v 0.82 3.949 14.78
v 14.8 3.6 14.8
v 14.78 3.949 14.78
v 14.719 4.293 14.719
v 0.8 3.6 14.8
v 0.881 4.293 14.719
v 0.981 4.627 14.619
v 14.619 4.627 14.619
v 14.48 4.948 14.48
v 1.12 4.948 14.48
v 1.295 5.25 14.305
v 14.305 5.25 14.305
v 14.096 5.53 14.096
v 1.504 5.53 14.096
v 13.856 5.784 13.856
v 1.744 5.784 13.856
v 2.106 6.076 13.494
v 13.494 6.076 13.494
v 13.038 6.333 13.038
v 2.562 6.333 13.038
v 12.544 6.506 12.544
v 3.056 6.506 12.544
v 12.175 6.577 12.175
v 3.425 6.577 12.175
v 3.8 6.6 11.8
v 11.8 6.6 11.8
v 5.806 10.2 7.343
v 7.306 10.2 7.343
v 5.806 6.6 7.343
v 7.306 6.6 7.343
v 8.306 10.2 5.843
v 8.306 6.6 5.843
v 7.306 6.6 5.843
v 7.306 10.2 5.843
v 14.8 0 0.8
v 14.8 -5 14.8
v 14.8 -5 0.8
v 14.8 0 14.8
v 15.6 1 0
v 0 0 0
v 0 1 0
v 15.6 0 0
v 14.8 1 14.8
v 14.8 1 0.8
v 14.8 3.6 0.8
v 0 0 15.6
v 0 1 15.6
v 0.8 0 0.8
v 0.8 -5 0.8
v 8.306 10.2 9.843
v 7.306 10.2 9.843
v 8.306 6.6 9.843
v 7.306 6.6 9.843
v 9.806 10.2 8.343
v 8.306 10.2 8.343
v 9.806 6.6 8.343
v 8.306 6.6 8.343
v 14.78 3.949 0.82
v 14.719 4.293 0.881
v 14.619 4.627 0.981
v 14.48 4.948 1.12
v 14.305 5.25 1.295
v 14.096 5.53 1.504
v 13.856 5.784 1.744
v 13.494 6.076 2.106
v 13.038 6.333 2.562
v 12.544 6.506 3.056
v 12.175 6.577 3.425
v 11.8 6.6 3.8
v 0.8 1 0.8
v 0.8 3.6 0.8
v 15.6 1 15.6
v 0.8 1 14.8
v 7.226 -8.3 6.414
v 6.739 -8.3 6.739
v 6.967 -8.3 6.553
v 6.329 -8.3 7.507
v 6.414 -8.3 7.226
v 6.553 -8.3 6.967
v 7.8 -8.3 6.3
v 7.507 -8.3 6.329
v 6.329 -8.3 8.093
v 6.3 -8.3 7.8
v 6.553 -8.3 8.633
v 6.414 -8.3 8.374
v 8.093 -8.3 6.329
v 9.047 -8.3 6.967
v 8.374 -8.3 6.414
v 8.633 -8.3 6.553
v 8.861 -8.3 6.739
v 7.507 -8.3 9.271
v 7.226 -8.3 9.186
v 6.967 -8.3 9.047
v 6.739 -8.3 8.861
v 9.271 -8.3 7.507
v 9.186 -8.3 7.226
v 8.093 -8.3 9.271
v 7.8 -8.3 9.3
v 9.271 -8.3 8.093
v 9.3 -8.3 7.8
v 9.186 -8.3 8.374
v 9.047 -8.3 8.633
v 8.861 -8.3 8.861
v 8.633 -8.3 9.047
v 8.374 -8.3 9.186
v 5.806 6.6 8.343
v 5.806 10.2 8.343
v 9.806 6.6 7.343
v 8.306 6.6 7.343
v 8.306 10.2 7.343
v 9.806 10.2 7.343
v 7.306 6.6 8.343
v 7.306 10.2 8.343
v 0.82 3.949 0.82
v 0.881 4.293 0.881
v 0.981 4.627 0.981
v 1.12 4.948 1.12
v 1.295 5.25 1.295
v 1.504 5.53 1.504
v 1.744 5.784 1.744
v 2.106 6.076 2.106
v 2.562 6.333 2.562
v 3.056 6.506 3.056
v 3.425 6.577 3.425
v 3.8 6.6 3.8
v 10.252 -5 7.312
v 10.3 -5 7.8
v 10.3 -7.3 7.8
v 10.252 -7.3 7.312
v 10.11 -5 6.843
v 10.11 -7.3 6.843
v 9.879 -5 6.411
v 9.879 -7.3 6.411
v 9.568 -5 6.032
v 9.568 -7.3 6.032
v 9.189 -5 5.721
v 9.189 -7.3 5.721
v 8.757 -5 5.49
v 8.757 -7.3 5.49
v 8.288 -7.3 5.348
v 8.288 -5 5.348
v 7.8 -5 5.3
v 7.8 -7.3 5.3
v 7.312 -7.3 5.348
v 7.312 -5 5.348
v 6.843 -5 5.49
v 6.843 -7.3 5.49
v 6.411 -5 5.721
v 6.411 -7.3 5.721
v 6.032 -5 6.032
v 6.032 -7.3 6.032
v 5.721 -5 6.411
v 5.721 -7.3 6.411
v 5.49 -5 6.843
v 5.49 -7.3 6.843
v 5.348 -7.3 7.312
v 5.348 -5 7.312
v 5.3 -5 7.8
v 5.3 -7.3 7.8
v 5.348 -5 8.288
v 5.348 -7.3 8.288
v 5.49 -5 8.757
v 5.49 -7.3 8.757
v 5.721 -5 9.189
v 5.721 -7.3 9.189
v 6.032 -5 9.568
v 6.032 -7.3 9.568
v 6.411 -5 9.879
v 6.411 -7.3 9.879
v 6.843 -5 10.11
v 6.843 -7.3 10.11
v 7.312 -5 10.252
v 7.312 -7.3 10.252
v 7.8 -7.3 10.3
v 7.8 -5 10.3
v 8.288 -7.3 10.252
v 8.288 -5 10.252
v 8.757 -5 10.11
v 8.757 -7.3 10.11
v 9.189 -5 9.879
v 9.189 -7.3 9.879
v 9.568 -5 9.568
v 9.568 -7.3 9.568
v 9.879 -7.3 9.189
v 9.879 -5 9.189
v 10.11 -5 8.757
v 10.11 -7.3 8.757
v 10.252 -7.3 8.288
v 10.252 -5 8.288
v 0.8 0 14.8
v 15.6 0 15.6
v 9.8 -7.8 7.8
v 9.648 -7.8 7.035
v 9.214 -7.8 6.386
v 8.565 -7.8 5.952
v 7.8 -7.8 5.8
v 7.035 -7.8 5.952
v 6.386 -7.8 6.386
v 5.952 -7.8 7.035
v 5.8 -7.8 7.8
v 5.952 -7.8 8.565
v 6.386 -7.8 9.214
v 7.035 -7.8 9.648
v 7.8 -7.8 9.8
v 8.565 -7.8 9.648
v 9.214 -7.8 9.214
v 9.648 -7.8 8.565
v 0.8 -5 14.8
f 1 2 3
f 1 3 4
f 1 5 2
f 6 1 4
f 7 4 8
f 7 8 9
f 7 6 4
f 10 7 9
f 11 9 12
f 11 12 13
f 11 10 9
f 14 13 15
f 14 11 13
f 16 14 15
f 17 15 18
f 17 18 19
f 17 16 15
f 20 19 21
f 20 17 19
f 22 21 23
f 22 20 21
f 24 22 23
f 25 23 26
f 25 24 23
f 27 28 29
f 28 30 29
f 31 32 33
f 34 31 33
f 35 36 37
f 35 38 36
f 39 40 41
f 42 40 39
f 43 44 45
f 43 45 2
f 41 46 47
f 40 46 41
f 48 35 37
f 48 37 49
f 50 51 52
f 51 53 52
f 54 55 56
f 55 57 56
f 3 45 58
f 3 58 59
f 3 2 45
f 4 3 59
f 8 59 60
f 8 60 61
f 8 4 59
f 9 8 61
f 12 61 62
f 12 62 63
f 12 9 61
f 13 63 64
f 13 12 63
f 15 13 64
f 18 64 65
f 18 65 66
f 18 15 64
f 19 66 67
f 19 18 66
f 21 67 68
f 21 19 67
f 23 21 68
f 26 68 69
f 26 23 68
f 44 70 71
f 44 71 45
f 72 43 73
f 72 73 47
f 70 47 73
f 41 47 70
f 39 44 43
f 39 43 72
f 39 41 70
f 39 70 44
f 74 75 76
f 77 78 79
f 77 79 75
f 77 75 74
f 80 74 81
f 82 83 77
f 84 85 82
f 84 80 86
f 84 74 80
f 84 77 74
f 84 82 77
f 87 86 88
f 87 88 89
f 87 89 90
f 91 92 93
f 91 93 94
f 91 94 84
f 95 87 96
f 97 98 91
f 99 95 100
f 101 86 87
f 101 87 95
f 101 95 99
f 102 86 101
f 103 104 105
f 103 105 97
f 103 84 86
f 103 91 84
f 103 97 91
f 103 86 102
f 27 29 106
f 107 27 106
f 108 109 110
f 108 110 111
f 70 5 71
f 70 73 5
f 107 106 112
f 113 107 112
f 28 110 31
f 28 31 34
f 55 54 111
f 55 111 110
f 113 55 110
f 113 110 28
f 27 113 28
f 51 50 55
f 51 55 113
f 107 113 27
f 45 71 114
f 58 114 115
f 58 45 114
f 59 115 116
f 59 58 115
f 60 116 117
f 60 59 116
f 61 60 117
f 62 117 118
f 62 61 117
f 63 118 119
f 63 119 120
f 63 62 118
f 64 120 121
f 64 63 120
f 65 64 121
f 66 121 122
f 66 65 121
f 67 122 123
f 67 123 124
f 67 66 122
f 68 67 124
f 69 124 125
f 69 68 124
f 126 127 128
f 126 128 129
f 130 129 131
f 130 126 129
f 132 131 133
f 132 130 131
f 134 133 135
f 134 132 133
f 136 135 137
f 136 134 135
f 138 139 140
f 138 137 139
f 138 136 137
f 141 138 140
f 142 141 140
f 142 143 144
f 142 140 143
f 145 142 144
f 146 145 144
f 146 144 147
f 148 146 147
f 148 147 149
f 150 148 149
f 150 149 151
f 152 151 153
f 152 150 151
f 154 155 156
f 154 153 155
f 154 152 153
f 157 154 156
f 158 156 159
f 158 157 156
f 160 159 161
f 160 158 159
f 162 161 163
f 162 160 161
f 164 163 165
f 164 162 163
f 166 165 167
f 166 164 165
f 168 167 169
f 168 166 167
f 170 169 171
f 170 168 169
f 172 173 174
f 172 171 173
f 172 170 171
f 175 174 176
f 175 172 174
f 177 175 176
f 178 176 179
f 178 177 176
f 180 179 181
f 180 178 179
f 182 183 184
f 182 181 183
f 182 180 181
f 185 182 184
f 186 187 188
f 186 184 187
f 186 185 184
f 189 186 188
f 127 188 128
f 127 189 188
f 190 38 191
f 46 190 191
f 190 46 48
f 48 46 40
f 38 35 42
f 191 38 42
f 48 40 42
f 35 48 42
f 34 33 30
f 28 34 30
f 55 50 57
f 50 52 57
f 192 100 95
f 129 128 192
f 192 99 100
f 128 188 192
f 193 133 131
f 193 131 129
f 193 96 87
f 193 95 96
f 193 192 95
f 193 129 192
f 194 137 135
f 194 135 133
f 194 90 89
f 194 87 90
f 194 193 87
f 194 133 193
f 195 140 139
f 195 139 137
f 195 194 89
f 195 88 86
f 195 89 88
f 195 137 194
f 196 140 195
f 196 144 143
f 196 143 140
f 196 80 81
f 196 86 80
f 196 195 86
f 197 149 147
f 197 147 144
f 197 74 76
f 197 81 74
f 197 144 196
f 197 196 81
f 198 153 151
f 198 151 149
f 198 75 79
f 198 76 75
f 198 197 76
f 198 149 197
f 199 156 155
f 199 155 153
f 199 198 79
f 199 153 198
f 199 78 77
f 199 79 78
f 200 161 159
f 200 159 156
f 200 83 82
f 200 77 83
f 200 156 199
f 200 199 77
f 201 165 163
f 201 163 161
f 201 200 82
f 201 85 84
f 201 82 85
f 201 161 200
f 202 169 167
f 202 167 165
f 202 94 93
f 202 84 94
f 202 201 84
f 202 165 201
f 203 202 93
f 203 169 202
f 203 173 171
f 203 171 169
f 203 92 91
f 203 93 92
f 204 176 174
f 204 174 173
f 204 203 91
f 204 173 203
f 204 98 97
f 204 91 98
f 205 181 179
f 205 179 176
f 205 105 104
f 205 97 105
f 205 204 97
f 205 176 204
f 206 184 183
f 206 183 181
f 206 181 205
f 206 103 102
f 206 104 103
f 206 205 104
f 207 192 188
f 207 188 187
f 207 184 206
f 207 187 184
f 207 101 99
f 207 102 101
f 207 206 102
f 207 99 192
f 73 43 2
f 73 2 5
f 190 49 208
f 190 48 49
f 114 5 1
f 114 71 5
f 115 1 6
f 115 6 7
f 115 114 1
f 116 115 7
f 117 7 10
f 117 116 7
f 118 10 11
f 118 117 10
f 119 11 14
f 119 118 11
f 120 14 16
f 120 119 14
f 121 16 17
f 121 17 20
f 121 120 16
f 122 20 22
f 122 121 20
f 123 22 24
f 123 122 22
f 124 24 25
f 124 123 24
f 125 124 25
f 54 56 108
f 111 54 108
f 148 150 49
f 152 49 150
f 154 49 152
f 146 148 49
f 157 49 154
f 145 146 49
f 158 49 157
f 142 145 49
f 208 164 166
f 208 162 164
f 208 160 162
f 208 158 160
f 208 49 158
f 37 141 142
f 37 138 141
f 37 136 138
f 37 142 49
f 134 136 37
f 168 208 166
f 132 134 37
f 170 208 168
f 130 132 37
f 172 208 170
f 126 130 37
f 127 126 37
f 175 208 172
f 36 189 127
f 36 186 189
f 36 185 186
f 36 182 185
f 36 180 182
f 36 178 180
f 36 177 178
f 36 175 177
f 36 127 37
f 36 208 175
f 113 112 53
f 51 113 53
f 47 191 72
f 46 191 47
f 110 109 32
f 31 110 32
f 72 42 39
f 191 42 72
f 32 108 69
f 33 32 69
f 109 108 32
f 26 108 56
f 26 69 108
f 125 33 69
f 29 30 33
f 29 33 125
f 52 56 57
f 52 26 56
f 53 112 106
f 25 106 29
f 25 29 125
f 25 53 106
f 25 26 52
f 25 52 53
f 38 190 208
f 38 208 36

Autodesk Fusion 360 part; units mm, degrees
sketch "Sketch1" plane through (0, 0, 0) normal (0, 1, 0) x (1, 0, 0)
  line L0 (0, 0) -> (15.6, 0)
  line L1 (15.6, 0) -> (15.6, -15.6)
  line L2 (15.6, -15.6) -> (0, -15.6)
  line L3 (0, -15.6) -> (0, 0)
  dimension "d1" = 15.6
  dimension "d2" = 15.6
extrude "Extrude1" add sketch "Sketch1" along normal blind 1
sketch "Sketch4" plane through (0, 0, 0) normal (0, -1, 0) x (1, 0, 0)
  line L0 (15.6, 15.6) -> (0, 15.6)
  line L1 (0, 15.6) -> (0, 0)
  line L2 (0, 0) -> (15.6, 0)
  line L3 (15.6, 0) -> (15.6, 15.6)
  line L4 (0.8, 14.8) -> (14.8, 14.8)
  line L5 (14.8, 14.8) -> (14.8, 0.8)
  line L6 (14.8, 0.8) -> (0.8, 0.8)
  line L7 (0.8, 0.8) -> (0.8, 14.8)
  dimension "d7" = 0.8
  dimension "d8" = 0.8
  dimension "d9" = 0.8
  dimension "d10" = 0.8
extrude "Extrude2" add sketch "Sketch4" along normal blind 5 contours L4 L5 L6 L7
sketch "Sketch5" plane through (0, 1, 0) normal (0, 1, 0) x (-1, 0, 0)
  line L0 (0, 15.6) -> (-15.6, 15.6)
  line L1 (-15.6, 15.6) -> (-15.6, 0)
  line L2 (-15.6, 0) -> (0, 0)
  line L3 (0, 0) -> (0, 15.6)
  line L4 (-0.8, 0.8) -> (-14.8, 0.8)
  line L5 (-14.8, 0.8) -> (-14.8, 14.8)
  line L6 (-14.8, 14.8) -> (-0.8, 14.8)
  line L7 (-0.8, 14.8) -> (-0.8, 0.8)
  dimension "d13" = 0.8
  dimension "d14" = 0.8
  dimension "d15" = 0.8
  dimension "d16" = 0.8
extrude "Extrude3" add sketch "Sketch5" along normal blind 5.6 contours L4 L5 L6 L7
fillet "Fillet1" radius 3 4 edges at (7.8, 6.6, 0.8) (14.8, 6.6, 7.8) (7.8, 6.6, 14.8) (0.8, 6.6, 7.8)
sketch "Sketch6" plane through (0, 6.6, 0) normal (0, 1, 0) x (-1, 0, 0)
  line L0 (-3.8, 11.8) -> (-11.8, 11.8)
  line L1 (-11.8, 11.8) -> (-11.8, 3.8)
  line L2 (-11.8, 3.8) -> (-3.8, 3.8)
  line L3 (-3.8, 3.8) -> (-3.8, 11.8)
  line L4 (-8.3063, 7.3427) -> (-8.3063, 5.8427)
  line L5 (-8.3063, 7.3427) -> (-9.8063, 7.3427)
  line L6 (-8.3063, 5.8427) -> (-7.3063, 5.8427)
  line L7 (-7.3063, 5.8427) -> (-7.3063, 7.3427)
  line L8 (-7.3063, 7.3427) -> (-5.8063, 7.3427)
  line L9 (-5.8063, 7.3427) -> (-5.8063, 8.3427)
  line L10 (-5.8063, 8.3427) -> (-7.3063, 8.3427)
  line L11 (-7.3063, 8.3427) -> (-7.3063, 9.8427)
  line L12 (-7.3063, 9.8427) -> (-8.3063, 9.8427)
  line L13 (-8.3063, 9.8427) -> (-8.3063, 8.3427)
  line L14 (-8.3063, 8.3427) -> (-9.8063, 8.3427)
  line L15 (-9.8063, 8.3427) -> (-9.8063, 7.3427)
extrude "Extrude4" add sketch "Sketch6" along normal blind 3.6 contours L4 L5 L6 L7 L8 L9 L10 L11 L12 L13 L14 L15
sketch "Sketch7" plane through (0, -5, 0) normal (0, -1, 0) x (1, 0, 0)
  line L0 (0.8, 0.8) -> (14.8, 0.8)
  line L1 (14.8, 0.8) -> (14.8, 14.8)
  line L2 (14.8, 14.8) -> (0.8, 14.8)
  line L3 (0.8, 14.8) -> (0.8, 0.8)
  circle A0 centre (7.8, 7.8) radius 2.5
extrude "Extrude5" add sketch "Sketch7" along normal blind 3.3 contours A0
chamfer "Chamfer1" distance 1 angle 45 1 edges at (5.4692, -8.3, 6.896)
